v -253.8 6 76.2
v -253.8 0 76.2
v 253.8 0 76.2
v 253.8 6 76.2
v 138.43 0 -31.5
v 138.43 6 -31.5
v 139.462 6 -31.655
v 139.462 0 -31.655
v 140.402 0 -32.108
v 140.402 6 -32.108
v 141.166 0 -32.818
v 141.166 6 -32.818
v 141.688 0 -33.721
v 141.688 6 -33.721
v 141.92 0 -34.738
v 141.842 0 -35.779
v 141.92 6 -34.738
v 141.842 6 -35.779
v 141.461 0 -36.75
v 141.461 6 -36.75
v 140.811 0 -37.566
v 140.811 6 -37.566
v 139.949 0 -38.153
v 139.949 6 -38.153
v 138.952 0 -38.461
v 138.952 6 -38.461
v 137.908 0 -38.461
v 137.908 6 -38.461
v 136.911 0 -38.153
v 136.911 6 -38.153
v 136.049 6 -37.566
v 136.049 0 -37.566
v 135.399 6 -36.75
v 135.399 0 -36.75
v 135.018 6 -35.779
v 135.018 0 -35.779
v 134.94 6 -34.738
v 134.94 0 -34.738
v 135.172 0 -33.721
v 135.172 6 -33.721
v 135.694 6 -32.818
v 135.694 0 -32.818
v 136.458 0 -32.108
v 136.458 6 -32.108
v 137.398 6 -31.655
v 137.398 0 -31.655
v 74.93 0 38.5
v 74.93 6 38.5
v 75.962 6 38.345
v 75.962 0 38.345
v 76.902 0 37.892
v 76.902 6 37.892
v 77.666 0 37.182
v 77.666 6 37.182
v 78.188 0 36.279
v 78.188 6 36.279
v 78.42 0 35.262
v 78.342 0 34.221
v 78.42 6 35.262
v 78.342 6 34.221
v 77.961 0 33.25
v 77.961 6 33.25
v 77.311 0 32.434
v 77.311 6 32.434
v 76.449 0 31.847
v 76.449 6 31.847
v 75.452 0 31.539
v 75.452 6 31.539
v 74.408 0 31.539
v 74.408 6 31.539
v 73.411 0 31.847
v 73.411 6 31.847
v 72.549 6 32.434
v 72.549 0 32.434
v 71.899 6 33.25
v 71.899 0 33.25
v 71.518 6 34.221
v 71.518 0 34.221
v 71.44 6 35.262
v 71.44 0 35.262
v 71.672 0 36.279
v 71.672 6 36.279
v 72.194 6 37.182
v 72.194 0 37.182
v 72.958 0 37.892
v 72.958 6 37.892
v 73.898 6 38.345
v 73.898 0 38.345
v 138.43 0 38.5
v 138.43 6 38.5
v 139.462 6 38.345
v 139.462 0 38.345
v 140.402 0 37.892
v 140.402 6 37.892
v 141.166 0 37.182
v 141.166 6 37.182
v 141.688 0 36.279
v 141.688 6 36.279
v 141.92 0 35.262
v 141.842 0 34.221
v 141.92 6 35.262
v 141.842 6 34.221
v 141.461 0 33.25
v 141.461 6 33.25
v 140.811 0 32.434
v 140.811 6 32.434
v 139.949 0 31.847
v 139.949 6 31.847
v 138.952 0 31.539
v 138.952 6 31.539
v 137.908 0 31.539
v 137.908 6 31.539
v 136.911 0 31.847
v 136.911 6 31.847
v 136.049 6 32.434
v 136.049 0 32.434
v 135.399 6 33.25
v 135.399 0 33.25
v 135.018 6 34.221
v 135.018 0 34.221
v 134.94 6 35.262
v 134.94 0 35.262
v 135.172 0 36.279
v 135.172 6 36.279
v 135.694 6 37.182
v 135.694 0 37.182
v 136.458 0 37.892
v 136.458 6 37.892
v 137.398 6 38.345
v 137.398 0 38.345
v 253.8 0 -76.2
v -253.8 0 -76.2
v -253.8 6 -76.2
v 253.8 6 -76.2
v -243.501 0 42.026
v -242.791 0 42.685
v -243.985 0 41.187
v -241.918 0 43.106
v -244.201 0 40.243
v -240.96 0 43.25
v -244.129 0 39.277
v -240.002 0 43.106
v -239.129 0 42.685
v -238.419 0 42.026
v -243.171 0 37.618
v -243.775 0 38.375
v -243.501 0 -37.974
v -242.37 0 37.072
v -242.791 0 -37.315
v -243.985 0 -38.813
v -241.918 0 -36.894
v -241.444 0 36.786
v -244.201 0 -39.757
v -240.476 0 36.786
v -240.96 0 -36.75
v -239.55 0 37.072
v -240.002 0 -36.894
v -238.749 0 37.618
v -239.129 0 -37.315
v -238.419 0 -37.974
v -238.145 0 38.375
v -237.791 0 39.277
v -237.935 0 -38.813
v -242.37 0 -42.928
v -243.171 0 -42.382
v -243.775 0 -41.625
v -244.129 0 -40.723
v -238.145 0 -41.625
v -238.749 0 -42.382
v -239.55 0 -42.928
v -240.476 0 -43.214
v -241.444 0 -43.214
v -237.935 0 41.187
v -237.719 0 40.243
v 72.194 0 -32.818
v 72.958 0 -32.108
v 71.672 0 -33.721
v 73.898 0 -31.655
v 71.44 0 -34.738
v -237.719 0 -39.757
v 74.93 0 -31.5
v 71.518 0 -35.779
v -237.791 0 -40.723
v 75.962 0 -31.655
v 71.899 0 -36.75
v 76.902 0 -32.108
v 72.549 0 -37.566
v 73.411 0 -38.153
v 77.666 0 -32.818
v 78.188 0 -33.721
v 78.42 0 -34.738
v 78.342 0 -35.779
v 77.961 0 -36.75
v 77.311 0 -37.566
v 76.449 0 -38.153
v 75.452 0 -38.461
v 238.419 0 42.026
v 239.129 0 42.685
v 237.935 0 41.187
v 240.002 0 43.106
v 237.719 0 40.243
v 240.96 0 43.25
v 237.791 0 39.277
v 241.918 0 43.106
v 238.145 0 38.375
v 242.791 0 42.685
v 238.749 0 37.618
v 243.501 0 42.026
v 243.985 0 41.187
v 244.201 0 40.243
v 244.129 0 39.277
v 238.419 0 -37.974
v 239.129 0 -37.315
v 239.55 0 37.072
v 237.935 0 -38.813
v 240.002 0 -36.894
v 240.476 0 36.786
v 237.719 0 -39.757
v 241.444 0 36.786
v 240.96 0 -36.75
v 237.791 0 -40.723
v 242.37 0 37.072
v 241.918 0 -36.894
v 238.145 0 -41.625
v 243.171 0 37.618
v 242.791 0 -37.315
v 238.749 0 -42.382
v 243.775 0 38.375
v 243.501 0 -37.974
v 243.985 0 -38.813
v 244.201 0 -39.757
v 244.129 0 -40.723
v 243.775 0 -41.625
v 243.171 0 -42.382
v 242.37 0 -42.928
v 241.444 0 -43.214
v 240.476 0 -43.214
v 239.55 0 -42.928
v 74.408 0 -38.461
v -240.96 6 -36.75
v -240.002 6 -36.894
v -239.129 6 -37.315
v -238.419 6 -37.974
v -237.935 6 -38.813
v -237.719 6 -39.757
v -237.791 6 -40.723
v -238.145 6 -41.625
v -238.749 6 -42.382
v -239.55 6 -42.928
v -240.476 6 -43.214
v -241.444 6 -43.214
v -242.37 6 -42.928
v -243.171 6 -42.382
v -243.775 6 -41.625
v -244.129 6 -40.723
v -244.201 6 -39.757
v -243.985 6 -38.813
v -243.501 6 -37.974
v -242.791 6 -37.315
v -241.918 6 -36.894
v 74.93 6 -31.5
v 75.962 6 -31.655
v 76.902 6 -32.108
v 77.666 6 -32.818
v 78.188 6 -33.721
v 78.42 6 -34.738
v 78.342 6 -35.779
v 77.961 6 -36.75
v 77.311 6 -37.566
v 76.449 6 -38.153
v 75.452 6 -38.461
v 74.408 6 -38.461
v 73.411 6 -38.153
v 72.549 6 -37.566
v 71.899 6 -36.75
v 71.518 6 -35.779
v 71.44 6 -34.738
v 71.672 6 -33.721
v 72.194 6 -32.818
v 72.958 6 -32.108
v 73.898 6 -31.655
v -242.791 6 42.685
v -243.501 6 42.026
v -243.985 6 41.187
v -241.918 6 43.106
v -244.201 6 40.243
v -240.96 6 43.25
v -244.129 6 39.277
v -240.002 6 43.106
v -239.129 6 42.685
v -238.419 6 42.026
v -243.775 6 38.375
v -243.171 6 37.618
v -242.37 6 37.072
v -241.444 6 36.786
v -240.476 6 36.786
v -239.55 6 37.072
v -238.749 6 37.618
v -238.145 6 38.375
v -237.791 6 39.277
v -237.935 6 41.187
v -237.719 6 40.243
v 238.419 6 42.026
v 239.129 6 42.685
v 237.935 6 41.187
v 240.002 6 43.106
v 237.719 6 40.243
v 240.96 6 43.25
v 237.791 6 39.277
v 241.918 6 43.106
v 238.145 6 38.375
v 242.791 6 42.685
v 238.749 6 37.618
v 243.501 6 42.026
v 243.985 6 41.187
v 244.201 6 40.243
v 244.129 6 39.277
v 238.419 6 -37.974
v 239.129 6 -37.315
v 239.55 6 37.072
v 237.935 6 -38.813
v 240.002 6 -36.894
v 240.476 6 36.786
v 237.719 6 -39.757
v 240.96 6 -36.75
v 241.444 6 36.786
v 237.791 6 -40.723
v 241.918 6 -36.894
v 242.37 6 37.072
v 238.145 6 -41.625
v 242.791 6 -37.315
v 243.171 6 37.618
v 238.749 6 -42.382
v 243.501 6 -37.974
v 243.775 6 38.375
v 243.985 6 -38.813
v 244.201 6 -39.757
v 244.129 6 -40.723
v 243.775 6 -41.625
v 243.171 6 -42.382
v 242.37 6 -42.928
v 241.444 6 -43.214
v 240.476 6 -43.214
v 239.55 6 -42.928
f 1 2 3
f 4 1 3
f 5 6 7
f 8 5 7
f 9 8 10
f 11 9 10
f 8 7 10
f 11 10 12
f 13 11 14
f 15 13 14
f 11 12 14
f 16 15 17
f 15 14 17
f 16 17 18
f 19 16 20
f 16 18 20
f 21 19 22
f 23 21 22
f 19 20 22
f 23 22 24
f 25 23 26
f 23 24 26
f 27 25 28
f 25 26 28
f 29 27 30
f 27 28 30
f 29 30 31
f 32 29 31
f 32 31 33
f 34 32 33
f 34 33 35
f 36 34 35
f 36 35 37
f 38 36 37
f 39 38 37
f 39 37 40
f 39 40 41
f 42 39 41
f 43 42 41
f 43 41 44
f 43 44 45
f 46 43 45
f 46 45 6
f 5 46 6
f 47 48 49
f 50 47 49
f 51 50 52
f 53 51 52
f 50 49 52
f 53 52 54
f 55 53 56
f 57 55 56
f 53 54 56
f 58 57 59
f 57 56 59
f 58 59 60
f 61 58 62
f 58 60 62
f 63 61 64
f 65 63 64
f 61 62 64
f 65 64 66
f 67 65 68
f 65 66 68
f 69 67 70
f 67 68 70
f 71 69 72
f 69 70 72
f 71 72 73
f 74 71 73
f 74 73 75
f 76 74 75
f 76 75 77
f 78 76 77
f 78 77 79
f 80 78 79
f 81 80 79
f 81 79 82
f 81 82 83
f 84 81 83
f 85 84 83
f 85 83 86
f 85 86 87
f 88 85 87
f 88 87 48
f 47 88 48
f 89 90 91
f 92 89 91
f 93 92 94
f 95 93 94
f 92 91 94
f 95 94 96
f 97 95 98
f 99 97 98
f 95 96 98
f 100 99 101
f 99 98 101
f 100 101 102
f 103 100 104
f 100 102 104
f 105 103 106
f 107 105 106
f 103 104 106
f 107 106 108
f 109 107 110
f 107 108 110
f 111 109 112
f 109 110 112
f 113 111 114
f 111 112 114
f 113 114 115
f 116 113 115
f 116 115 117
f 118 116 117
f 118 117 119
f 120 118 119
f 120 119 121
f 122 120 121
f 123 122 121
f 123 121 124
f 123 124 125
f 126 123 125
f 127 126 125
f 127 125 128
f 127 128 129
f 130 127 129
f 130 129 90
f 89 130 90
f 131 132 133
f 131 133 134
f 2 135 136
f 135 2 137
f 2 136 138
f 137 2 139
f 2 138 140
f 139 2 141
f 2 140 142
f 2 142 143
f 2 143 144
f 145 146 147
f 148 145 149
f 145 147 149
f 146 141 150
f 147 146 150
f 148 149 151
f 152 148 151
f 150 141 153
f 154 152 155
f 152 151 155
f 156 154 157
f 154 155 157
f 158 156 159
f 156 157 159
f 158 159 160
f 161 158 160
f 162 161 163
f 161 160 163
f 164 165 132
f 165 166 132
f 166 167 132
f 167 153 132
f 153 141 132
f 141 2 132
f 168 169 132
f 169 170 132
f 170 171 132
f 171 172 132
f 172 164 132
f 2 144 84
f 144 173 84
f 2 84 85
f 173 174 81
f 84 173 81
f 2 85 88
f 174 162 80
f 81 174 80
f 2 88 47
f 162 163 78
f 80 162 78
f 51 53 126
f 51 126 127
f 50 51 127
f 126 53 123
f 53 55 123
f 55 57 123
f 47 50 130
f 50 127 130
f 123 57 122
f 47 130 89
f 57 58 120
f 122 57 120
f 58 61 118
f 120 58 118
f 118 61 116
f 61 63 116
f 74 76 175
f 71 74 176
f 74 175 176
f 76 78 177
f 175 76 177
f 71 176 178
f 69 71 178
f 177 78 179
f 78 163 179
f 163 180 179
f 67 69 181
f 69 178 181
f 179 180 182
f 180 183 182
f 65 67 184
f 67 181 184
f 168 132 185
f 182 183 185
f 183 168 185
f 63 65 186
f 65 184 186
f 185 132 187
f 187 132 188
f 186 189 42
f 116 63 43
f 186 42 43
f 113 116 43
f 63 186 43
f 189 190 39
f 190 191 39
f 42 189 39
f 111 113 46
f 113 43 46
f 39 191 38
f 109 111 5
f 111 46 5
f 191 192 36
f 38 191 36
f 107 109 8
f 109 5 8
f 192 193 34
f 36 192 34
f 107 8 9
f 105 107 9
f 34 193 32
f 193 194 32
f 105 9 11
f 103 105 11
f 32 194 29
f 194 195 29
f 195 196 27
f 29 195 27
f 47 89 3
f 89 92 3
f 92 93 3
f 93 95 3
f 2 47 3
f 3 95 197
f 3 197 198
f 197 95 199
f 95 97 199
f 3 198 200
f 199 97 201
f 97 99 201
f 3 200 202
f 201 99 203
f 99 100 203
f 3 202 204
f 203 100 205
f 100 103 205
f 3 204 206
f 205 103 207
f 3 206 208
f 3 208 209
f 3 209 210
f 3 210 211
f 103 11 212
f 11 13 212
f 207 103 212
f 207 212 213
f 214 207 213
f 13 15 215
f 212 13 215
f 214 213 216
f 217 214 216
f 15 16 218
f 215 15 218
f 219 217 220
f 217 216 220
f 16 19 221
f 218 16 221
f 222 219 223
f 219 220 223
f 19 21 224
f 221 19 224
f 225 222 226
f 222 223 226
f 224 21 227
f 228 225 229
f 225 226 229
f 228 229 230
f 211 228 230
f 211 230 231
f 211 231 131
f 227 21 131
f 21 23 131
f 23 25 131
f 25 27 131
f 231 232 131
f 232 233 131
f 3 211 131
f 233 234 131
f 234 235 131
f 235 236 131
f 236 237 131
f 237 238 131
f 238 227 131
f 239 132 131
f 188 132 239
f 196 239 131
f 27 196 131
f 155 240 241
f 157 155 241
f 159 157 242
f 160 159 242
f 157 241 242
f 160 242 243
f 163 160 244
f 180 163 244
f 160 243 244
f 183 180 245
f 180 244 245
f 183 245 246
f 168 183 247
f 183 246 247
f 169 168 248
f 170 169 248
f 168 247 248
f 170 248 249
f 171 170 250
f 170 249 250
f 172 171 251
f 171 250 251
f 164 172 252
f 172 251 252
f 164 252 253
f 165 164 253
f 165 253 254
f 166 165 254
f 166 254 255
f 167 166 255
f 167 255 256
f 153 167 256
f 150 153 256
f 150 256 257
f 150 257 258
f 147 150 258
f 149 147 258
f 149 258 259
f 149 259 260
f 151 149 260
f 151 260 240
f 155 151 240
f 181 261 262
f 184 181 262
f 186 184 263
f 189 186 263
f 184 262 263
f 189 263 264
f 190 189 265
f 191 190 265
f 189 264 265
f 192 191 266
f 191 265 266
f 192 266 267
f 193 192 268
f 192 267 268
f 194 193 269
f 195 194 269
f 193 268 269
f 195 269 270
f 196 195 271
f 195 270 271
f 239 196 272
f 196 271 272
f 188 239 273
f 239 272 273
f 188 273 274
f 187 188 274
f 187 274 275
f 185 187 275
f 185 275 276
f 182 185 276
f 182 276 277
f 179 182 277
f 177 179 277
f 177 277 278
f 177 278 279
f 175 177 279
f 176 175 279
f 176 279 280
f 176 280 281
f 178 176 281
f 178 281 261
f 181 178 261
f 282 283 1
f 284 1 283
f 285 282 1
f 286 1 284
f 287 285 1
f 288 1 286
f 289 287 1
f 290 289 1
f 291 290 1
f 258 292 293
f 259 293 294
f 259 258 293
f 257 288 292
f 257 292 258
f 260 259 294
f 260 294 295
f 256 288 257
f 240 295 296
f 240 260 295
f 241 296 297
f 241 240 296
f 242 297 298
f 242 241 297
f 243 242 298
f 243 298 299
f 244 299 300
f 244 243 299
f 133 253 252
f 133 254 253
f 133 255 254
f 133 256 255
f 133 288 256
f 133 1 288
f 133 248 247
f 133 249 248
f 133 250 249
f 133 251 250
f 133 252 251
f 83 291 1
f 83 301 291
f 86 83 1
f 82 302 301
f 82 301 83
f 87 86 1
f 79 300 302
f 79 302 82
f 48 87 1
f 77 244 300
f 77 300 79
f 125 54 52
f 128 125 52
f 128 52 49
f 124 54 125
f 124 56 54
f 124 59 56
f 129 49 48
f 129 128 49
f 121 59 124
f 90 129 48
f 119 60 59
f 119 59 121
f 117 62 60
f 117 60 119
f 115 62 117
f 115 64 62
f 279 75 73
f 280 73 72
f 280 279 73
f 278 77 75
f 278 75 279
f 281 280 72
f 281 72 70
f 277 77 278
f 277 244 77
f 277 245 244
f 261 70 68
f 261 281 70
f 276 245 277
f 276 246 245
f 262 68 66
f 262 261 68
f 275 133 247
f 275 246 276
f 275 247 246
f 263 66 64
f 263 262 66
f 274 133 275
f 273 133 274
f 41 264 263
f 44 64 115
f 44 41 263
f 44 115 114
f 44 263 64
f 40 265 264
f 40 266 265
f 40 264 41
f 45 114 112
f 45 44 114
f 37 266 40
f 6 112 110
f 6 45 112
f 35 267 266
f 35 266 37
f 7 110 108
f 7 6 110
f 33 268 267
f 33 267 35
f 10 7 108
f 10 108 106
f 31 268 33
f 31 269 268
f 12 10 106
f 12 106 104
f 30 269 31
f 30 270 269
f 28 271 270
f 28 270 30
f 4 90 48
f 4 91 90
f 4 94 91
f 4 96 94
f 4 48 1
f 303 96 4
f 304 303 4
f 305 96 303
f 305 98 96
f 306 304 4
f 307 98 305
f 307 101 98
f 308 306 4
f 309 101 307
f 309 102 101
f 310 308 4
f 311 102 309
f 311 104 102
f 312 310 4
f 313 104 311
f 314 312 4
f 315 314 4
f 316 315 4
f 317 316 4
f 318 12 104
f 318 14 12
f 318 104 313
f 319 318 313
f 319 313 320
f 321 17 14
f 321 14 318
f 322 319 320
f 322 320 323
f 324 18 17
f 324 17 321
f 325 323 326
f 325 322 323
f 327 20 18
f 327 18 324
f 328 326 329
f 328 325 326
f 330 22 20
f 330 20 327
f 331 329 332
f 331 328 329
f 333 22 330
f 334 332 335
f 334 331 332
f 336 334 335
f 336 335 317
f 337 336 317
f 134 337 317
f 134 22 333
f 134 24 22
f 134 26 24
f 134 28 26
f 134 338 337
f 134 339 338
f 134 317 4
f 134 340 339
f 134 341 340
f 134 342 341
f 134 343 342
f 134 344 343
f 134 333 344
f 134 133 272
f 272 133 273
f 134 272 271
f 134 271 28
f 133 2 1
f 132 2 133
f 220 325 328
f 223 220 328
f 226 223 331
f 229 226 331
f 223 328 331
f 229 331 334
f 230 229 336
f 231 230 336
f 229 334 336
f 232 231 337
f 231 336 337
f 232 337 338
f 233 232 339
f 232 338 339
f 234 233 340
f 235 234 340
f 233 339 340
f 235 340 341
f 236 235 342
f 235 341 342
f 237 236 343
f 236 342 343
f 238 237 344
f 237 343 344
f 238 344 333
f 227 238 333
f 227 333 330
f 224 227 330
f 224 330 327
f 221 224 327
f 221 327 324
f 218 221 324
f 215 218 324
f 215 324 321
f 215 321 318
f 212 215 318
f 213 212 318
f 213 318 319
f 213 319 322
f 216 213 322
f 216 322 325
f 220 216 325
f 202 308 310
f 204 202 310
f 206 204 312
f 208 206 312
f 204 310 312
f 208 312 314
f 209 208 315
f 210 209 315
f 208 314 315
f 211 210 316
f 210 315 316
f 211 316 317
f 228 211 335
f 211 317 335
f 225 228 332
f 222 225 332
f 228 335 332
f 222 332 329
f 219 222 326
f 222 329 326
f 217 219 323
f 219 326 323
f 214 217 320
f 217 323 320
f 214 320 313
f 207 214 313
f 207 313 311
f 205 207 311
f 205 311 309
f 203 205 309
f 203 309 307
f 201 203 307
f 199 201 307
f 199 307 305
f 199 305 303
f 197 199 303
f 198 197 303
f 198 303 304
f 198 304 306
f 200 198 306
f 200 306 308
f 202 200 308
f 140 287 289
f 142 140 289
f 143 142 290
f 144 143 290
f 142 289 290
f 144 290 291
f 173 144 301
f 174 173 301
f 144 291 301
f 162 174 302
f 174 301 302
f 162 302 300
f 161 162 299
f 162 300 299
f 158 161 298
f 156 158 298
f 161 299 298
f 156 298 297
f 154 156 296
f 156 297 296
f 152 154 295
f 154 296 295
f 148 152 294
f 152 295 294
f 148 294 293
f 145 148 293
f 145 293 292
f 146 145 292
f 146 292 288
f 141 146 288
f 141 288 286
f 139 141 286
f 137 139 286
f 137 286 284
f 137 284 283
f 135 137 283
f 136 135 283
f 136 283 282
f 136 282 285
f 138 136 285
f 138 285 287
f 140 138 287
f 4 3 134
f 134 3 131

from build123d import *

# Parameters (mm, degrees)
SKETCH1_W           = 507.6
SKETCH1_H           = 152.4
BOSS_EXTRUDE1_DEPTH = 6
SKETCH2_R           = 3.25
CUT_EXTRUDE1_DEPTH  = 266.060144118
SKETCH3_R           = 3.5
CUT_EXTRUDE2_DEPTH  = 266.060144118


with BuildPart() as part:
    # Sketch1 → Boss-Extrude1 (new body)
    with BuildSketch(Plane(origin=(0, 0, 0), x_dir=(1, 0, 0), z_dir=(0, 1, 0))):
        Rectangle(SKETCH1_W, SKETCH1_H)
    extrude(amount=BOSS_EXTRUDE1_DEPTH)

    # Sketch2 → Cut-Extrude1 (cut, through all)
    with BuildSketch(Plane(origin=(0, 6, 0), x_dir=(1, 0, 0), z_dir=(0, 1, 0))):
        with Locations(Location((240.96, 40, 0), (0, 0, 270))):
            Circle(SKETCH2_R)
        with Locations(Location((240.96, -40, 0), (0, 0, 270))):
            Circle(SKETCH2_R)
        with Locations(Location((-240.96, -40, 0), (0, 0, 270))):
            Circle(SKETCH2_R)
        with Locations(Location((-240.96, 40, 0), (0, 0, 270))):
            Circle(SKETCH2_R)
    extrude(amount=-CUT_EXTRUDE1_DEPTH, mode=Mode.SUBTRACT)

    # Sketch3 → Cut-Extrude2 (cut, through all)
    with BuildSketch(Plane(origin=(0, 6, 0), x_dir=(1, 0, 0), z_dir=(0, 1, 0))):
        with Locations(Location((138.43, 35, 0), (0, 0, 270))):
            Circle(SKETCH3_R)
        with Locations(Location((74.93, 35, 0), (0, 0, 270))):
            Circle(SKETCH3_R)
        with Locations(Location((74.93, -35, 0), (0, 0, 270))):
            Circle(SKETCH3_R)
        with Locations(Location((138.43, -35, 0), (0, 0, 270))):
            Circle(SKETCH3_R)
    extrude(amount=-CUT_EXTRUDE2_DEPTH, mode=Mode.SUBTRACT)


solid = part.part
